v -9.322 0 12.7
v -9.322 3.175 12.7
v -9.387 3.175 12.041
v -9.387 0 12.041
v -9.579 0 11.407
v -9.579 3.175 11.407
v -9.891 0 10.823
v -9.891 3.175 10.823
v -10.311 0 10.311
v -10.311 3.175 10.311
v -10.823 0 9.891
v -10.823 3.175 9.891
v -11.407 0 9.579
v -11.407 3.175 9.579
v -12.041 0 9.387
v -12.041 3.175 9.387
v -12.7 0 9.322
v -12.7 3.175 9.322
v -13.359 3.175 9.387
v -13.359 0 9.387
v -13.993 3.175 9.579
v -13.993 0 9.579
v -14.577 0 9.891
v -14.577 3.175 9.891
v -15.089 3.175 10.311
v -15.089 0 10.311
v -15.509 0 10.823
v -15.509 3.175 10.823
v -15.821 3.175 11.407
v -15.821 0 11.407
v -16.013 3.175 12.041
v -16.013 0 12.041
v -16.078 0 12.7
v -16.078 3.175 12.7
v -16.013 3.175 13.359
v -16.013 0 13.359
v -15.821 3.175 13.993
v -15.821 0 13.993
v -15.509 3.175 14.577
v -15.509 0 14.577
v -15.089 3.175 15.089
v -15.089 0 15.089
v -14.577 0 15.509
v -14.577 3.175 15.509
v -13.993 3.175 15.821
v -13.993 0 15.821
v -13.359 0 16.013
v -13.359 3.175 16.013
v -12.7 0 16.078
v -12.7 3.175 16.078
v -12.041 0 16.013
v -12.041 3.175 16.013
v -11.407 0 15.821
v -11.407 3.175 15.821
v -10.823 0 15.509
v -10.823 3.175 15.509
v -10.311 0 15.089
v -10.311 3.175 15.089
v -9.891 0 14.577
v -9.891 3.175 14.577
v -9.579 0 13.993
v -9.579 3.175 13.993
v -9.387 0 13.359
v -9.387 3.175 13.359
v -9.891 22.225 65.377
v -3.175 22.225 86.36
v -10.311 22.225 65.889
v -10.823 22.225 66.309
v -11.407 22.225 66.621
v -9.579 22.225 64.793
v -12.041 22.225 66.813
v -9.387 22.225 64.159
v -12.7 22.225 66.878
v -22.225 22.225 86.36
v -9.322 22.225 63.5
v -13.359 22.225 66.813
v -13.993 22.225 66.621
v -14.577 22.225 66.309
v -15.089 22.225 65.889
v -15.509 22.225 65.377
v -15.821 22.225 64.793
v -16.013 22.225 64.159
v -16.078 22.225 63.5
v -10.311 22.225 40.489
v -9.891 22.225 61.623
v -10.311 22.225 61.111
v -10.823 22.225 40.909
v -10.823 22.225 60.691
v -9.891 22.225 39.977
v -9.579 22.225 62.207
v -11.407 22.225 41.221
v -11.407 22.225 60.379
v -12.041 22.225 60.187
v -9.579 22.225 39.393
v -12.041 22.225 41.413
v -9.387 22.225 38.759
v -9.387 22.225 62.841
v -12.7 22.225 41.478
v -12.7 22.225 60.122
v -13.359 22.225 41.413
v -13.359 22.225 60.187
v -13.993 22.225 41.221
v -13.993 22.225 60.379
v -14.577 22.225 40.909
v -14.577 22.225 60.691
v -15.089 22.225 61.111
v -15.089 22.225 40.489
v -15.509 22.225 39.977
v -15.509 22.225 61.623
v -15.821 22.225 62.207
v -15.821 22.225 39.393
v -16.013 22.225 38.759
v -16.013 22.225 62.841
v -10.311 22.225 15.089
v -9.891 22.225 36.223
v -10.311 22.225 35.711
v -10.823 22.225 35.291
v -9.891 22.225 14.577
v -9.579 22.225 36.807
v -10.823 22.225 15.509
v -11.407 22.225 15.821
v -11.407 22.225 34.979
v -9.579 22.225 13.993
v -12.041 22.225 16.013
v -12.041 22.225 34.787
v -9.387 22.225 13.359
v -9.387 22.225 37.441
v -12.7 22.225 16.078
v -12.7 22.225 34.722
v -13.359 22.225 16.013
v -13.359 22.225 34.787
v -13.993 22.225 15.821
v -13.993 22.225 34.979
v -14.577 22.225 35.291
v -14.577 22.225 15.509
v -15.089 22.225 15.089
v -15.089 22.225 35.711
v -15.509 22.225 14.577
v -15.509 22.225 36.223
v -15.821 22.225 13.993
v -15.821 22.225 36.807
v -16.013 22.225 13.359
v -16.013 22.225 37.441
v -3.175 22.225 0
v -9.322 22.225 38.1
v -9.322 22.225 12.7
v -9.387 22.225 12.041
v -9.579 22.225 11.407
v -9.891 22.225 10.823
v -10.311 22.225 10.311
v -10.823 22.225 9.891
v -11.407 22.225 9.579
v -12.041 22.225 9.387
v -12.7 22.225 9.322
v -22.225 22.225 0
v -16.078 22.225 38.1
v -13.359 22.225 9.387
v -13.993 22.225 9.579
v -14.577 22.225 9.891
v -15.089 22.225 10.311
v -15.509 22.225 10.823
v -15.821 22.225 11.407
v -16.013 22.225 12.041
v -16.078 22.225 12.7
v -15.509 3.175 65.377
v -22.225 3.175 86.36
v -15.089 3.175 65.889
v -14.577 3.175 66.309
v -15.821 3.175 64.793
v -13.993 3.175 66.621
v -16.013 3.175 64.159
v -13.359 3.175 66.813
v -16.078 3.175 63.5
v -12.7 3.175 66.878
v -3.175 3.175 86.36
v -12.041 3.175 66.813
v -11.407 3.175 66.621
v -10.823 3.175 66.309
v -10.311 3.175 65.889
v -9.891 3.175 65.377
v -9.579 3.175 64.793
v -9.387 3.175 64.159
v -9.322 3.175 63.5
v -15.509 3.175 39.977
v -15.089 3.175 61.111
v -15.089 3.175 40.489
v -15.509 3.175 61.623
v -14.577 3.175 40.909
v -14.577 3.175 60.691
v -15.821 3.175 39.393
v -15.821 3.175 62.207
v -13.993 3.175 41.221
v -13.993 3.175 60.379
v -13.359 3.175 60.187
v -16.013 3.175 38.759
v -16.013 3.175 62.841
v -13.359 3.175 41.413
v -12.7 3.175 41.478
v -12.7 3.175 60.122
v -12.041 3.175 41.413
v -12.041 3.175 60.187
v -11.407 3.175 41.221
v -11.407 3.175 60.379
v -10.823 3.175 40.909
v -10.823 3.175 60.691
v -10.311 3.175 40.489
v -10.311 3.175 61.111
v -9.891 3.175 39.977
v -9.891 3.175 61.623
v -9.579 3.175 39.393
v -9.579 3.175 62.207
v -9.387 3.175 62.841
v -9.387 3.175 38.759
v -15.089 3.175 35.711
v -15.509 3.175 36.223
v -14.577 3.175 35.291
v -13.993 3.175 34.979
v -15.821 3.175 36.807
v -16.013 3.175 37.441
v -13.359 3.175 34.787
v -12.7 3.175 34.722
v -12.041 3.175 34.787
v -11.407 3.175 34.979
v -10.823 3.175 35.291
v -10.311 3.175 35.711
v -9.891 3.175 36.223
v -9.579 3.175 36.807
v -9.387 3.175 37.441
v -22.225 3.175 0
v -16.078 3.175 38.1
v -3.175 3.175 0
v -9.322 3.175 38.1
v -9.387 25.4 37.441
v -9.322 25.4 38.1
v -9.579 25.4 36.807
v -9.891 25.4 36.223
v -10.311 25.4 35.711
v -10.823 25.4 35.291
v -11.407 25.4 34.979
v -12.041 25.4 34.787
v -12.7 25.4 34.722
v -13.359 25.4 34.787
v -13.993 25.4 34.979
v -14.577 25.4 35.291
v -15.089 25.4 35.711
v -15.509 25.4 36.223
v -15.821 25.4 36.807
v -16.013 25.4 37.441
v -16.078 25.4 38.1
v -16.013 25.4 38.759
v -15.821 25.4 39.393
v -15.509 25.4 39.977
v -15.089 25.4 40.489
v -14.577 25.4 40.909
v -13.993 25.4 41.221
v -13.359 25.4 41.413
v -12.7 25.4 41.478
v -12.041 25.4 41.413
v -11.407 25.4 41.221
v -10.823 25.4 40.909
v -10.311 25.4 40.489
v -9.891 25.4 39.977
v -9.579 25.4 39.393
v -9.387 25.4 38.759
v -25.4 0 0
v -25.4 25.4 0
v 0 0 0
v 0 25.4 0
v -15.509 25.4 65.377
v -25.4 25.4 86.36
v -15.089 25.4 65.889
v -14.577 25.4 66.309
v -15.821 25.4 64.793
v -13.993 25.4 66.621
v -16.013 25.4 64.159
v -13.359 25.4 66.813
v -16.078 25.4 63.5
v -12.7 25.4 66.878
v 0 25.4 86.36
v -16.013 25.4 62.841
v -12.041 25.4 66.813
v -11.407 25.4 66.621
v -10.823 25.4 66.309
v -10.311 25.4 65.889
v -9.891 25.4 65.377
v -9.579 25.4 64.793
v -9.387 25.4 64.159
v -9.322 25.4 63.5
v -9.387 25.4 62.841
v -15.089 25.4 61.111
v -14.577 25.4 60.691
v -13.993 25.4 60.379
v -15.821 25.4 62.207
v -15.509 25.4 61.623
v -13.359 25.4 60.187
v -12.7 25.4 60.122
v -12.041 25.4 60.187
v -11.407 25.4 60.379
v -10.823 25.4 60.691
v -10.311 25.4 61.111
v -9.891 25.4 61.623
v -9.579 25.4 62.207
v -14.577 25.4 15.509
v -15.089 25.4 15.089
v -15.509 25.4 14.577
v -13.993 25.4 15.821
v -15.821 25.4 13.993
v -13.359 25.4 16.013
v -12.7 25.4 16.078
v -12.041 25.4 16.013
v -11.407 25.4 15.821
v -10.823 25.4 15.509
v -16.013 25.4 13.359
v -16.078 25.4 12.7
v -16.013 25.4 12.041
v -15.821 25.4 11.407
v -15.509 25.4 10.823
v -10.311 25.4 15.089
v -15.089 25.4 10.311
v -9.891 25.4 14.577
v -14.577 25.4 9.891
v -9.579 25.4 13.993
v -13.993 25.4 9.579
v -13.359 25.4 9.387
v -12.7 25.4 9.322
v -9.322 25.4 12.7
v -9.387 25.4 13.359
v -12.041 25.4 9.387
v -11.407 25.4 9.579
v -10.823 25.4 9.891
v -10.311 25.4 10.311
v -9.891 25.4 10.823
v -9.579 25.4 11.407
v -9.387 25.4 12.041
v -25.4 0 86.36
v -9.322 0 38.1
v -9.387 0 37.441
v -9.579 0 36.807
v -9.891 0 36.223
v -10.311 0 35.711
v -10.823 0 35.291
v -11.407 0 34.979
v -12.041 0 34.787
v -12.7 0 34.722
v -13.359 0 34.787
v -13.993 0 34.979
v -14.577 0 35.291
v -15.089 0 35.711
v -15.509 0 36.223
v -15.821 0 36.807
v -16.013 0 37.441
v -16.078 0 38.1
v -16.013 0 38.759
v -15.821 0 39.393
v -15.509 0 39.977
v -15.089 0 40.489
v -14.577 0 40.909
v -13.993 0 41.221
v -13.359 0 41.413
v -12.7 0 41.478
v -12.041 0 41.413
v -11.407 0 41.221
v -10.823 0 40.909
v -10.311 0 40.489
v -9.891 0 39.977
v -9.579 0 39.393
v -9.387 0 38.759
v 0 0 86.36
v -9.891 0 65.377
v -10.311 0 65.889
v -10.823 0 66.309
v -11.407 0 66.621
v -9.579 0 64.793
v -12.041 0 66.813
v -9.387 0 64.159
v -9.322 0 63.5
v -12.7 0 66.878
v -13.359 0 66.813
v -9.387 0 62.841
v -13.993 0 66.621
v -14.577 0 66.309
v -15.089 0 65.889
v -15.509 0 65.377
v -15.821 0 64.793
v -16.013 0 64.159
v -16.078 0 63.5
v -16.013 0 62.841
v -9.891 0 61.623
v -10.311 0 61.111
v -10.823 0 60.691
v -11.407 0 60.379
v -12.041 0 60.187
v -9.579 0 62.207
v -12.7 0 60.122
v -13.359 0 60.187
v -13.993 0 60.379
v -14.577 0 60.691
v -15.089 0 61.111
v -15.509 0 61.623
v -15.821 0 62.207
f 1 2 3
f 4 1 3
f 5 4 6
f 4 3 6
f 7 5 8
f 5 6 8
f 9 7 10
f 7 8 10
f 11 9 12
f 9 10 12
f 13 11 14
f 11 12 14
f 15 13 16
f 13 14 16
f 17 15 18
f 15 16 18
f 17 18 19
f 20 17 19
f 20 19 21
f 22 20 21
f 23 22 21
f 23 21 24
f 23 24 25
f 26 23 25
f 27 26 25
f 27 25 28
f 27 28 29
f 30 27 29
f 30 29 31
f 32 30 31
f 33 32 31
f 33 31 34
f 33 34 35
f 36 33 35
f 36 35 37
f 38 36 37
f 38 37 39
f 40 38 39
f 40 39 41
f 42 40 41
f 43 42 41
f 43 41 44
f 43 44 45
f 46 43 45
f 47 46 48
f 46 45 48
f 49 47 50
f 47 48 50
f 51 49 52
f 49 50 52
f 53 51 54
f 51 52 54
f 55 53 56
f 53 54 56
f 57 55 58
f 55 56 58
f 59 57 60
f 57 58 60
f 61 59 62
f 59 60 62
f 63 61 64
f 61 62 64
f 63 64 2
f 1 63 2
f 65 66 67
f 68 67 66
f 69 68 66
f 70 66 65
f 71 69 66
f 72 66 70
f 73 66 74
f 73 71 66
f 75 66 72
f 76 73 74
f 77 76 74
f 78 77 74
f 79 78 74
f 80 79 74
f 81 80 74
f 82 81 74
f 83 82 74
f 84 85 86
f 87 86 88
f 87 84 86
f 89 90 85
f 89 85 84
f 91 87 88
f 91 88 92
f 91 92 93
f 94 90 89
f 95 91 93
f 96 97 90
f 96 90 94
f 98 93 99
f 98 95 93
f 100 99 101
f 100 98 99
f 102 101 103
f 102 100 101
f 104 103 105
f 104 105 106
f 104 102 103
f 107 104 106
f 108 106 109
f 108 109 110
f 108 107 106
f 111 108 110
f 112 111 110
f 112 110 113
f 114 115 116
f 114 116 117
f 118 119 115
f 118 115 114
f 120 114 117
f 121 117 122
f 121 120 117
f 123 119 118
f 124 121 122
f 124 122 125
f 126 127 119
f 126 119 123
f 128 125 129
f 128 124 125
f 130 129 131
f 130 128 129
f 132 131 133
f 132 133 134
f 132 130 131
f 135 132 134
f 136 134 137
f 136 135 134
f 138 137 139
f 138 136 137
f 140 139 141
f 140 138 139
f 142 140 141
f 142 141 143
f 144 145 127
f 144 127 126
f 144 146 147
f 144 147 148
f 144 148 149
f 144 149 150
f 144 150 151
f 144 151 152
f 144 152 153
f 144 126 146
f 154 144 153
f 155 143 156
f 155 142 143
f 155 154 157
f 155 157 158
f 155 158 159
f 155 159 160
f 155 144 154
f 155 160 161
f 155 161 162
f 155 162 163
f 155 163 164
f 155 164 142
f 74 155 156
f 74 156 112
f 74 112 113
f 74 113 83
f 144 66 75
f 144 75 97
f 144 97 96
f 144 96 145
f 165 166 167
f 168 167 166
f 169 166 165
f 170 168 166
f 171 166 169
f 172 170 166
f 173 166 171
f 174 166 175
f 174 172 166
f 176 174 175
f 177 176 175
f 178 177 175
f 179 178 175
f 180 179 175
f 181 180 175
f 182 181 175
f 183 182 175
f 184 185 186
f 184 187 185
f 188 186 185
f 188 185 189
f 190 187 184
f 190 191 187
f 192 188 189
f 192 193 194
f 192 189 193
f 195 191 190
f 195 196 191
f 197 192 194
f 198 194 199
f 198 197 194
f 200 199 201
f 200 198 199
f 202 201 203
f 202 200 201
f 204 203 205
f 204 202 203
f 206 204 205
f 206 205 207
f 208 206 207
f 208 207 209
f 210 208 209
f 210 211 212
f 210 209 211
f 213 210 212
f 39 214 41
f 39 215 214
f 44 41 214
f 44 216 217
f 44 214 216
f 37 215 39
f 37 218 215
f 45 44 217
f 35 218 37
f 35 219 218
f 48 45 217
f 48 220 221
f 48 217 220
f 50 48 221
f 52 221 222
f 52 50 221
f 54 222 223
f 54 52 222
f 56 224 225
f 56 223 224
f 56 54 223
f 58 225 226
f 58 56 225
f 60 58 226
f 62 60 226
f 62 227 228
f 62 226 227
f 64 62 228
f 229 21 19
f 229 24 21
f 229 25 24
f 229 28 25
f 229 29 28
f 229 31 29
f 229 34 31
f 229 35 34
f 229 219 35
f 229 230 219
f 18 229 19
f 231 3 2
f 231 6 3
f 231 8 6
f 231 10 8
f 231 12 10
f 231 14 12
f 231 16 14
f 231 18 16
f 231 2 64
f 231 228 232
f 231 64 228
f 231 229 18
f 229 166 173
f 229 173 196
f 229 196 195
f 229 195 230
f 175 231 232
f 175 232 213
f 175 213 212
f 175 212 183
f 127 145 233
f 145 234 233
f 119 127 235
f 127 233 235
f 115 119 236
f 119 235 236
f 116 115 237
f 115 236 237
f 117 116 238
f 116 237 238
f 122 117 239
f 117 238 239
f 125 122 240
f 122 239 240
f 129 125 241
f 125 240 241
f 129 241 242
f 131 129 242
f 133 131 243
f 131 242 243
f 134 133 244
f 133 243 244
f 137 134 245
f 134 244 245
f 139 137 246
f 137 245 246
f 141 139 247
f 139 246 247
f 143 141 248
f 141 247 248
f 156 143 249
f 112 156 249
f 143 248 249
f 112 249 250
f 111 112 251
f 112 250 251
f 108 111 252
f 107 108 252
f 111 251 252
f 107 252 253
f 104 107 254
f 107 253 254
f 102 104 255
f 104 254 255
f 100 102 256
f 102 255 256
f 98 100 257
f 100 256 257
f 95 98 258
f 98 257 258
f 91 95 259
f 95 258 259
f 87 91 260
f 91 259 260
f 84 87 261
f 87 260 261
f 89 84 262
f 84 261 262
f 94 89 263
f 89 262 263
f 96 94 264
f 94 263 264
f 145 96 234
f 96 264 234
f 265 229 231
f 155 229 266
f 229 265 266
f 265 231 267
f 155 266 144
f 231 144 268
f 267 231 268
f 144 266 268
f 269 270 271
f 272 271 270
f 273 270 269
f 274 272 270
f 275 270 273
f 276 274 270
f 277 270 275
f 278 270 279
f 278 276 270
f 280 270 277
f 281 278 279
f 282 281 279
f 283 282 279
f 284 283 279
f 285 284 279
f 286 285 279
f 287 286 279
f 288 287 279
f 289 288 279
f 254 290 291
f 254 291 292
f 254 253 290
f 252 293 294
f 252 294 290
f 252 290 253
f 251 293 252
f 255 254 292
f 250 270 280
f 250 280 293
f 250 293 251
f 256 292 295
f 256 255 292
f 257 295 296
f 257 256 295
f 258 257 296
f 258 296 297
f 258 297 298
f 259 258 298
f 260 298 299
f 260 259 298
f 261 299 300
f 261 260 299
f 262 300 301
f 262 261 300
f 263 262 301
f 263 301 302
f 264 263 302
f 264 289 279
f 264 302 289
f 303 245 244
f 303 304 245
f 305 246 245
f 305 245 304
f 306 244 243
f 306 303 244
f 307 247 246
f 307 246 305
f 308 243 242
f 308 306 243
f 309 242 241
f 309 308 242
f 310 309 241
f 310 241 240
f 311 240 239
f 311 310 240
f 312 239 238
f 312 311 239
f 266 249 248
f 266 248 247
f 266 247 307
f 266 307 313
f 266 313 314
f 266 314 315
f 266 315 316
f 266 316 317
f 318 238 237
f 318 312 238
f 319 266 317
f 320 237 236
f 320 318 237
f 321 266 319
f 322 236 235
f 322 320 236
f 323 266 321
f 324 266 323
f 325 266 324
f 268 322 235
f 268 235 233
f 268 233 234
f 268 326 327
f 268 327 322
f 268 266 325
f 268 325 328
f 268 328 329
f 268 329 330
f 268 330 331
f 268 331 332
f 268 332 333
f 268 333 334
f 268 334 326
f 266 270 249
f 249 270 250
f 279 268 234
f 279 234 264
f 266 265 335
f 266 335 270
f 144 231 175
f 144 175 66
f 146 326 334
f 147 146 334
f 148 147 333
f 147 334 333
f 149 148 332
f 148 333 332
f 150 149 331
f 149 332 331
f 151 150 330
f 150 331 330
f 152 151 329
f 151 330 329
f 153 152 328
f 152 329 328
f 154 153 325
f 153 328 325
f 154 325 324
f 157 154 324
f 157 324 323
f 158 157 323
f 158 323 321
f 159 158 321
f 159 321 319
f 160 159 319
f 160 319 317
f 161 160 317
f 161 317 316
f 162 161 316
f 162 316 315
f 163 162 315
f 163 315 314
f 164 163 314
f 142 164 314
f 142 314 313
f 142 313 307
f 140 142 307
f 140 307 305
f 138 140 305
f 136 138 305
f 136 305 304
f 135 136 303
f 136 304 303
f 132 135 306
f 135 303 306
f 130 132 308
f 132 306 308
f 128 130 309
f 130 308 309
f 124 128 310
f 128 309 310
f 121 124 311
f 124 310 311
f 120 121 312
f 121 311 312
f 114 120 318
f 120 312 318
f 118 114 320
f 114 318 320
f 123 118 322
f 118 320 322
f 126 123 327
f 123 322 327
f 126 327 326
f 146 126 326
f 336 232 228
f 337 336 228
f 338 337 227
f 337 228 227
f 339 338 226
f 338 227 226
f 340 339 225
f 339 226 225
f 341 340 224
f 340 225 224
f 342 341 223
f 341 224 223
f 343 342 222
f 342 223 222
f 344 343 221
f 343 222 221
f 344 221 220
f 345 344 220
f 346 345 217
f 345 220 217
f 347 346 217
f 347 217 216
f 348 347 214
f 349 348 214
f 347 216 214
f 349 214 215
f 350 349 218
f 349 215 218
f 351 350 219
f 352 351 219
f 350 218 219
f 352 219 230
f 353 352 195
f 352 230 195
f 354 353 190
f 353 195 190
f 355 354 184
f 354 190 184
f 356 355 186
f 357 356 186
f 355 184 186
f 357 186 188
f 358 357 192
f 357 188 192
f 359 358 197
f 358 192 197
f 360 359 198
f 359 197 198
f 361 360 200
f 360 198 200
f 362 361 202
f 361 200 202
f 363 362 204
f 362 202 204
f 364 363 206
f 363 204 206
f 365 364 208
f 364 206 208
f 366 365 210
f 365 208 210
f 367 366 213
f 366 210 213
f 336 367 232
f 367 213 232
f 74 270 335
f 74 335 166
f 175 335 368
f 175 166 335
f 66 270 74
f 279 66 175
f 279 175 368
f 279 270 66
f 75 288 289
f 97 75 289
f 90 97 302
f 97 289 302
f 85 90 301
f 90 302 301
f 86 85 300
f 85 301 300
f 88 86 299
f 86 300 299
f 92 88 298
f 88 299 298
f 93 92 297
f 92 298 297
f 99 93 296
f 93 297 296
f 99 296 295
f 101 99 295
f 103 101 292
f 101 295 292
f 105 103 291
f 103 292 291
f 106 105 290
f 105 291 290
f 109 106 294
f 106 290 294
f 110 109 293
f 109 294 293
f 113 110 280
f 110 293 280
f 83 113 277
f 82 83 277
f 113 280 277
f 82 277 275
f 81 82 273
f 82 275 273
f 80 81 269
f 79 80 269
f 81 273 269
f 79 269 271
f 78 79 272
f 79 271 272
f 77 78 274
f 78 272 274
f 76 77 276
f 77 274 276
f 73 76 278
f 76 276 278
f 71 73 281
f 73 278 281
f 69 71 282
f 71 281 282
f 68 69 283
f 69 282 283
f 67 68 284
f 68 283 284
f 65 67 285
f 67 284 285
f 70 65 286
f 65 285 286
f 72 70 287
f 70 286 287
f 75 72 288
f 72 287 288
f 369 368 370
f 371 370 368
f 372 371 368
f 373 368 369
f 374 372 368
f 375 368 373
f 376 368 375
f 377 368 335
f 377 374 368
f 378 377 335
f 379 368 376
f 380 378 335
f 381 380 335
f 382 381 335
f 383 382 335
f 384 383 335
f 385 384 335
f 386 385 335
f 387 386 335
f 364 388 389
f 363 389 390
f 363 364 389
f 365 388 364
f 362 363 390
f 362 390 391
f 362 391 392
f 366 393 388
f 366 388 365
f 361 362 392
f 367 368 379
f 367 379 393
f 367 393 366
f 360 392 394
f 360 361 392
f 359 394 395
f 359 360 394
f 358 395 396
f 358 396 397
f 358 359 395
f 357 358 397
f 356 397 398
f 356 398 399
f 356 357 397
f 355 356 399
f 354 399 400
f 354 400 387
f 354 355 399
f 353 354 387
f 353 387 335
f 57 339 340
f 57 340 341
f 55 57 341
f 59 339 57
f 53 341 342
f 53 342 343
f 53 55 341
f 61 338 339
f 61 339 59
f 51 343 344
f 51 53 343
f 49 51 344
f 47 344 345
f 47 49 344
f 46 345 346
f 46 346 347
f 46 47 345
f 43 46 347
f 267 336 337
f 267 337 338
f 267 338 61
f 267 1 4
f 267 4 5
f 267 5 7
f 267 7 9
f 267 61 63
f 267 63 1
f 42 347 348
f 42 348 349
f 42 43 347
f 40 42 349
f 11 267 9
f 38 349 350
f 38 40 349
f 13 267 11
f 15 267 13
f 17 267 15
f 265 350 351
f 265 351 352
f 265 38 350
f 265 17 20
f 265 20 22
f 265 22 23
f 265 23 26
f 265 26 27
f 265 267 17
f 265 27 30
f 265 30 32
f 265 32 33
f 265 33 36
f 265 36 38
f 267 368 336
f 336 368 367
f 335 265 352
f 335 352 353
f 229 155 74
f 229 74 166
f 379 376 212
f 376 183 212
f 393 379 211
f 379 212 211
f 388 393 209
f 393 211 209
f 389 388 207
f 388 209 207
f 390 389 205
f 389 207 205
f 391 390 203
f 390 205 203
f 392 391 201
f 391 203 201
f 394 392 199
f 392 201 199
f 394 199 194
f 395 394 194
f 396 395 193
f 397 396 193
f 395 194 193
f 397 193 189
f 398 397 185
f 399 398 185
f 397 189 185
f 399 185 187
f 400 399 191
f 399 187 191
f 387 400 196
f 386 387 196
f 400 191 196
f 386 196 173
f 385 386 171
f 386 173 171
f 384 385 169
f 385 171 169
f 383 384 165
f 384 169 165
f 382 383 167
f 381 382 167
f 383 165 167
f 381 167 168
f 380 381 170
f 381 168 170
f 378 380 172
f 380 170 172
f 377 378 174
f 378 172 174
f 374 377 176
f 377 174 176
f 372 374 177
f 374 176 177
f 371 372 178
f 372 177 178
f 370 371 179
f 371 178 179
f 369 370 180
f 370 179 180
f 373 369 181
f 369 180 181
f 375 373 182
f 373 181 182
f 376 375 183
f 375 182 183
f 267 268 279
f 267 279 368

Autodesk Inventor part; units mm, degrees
ref_plane "YZ Plane" through (0, 0, 0) normal (1, 0, 0) x (0, 1, 0)
ref_plane "XZ Plane" through (0, 0, 0) normal (0, 1, 0) x (-1, 0, 0)
ref_plane "XY Plane" through (0, 0, 0) normal (0, 0, 1) x (1, 0, 0)
sketch "Sketch1" plane through (0, 0, 0) normal (0, 0, 1) x (1, 0, 0)
  line L0 (0, 0) -> (-25.4, 0)
  line L1 (-25.4, 0) -> (-25.4, 25.4)
  line L2 (-25.4, 25.4) -> (0, 25.4)
  line L3 (0, 25.4) -> (0, 0)
  line L4 (-3.175, 22.225) -> (-22.225, 22.225)
  line L5 (-22.225, 22.225) -> (-22.225, 3.175)
  line L6 (-22.225, 3.175) -> (-3.175, 3.175)
  line L7 (-3.175, 3.175) -> (-3.175, 22.225)
  dimension "d0" = 25.4
  dimension "d1" = 25.4
  dimension "d2" = 3.175
extrude "Extrusion1" add sketch "Sketch1" along normal blind 86.36
sketch "Sketch2" plane through (-25.4, 25.4, 0) normal (0, 1, 0) x (1, 0, 0)
  line L0 (0, 0) -> (25.4, 0) projected
  line L1 (25.4, 0) -> (25.4, -86.36) projected
  line L2 (12.7, 0) -> (12.7, -12.7)
  circle A0 centre (12.7, -12.7) radius 3.3782
  dimension "d5" = 12.7
  dimension "d6" = 6.7564
extrude "Extrusion2" cut sketch "Sketch2" against normal blind 86.36
pattern_linear "Rectangular Pattern1" count 3 spacing 25.4 along (0, 0, 1) of "Extrusion2"
properties part number "corner bumper mount" material "Aluminum 6061"
